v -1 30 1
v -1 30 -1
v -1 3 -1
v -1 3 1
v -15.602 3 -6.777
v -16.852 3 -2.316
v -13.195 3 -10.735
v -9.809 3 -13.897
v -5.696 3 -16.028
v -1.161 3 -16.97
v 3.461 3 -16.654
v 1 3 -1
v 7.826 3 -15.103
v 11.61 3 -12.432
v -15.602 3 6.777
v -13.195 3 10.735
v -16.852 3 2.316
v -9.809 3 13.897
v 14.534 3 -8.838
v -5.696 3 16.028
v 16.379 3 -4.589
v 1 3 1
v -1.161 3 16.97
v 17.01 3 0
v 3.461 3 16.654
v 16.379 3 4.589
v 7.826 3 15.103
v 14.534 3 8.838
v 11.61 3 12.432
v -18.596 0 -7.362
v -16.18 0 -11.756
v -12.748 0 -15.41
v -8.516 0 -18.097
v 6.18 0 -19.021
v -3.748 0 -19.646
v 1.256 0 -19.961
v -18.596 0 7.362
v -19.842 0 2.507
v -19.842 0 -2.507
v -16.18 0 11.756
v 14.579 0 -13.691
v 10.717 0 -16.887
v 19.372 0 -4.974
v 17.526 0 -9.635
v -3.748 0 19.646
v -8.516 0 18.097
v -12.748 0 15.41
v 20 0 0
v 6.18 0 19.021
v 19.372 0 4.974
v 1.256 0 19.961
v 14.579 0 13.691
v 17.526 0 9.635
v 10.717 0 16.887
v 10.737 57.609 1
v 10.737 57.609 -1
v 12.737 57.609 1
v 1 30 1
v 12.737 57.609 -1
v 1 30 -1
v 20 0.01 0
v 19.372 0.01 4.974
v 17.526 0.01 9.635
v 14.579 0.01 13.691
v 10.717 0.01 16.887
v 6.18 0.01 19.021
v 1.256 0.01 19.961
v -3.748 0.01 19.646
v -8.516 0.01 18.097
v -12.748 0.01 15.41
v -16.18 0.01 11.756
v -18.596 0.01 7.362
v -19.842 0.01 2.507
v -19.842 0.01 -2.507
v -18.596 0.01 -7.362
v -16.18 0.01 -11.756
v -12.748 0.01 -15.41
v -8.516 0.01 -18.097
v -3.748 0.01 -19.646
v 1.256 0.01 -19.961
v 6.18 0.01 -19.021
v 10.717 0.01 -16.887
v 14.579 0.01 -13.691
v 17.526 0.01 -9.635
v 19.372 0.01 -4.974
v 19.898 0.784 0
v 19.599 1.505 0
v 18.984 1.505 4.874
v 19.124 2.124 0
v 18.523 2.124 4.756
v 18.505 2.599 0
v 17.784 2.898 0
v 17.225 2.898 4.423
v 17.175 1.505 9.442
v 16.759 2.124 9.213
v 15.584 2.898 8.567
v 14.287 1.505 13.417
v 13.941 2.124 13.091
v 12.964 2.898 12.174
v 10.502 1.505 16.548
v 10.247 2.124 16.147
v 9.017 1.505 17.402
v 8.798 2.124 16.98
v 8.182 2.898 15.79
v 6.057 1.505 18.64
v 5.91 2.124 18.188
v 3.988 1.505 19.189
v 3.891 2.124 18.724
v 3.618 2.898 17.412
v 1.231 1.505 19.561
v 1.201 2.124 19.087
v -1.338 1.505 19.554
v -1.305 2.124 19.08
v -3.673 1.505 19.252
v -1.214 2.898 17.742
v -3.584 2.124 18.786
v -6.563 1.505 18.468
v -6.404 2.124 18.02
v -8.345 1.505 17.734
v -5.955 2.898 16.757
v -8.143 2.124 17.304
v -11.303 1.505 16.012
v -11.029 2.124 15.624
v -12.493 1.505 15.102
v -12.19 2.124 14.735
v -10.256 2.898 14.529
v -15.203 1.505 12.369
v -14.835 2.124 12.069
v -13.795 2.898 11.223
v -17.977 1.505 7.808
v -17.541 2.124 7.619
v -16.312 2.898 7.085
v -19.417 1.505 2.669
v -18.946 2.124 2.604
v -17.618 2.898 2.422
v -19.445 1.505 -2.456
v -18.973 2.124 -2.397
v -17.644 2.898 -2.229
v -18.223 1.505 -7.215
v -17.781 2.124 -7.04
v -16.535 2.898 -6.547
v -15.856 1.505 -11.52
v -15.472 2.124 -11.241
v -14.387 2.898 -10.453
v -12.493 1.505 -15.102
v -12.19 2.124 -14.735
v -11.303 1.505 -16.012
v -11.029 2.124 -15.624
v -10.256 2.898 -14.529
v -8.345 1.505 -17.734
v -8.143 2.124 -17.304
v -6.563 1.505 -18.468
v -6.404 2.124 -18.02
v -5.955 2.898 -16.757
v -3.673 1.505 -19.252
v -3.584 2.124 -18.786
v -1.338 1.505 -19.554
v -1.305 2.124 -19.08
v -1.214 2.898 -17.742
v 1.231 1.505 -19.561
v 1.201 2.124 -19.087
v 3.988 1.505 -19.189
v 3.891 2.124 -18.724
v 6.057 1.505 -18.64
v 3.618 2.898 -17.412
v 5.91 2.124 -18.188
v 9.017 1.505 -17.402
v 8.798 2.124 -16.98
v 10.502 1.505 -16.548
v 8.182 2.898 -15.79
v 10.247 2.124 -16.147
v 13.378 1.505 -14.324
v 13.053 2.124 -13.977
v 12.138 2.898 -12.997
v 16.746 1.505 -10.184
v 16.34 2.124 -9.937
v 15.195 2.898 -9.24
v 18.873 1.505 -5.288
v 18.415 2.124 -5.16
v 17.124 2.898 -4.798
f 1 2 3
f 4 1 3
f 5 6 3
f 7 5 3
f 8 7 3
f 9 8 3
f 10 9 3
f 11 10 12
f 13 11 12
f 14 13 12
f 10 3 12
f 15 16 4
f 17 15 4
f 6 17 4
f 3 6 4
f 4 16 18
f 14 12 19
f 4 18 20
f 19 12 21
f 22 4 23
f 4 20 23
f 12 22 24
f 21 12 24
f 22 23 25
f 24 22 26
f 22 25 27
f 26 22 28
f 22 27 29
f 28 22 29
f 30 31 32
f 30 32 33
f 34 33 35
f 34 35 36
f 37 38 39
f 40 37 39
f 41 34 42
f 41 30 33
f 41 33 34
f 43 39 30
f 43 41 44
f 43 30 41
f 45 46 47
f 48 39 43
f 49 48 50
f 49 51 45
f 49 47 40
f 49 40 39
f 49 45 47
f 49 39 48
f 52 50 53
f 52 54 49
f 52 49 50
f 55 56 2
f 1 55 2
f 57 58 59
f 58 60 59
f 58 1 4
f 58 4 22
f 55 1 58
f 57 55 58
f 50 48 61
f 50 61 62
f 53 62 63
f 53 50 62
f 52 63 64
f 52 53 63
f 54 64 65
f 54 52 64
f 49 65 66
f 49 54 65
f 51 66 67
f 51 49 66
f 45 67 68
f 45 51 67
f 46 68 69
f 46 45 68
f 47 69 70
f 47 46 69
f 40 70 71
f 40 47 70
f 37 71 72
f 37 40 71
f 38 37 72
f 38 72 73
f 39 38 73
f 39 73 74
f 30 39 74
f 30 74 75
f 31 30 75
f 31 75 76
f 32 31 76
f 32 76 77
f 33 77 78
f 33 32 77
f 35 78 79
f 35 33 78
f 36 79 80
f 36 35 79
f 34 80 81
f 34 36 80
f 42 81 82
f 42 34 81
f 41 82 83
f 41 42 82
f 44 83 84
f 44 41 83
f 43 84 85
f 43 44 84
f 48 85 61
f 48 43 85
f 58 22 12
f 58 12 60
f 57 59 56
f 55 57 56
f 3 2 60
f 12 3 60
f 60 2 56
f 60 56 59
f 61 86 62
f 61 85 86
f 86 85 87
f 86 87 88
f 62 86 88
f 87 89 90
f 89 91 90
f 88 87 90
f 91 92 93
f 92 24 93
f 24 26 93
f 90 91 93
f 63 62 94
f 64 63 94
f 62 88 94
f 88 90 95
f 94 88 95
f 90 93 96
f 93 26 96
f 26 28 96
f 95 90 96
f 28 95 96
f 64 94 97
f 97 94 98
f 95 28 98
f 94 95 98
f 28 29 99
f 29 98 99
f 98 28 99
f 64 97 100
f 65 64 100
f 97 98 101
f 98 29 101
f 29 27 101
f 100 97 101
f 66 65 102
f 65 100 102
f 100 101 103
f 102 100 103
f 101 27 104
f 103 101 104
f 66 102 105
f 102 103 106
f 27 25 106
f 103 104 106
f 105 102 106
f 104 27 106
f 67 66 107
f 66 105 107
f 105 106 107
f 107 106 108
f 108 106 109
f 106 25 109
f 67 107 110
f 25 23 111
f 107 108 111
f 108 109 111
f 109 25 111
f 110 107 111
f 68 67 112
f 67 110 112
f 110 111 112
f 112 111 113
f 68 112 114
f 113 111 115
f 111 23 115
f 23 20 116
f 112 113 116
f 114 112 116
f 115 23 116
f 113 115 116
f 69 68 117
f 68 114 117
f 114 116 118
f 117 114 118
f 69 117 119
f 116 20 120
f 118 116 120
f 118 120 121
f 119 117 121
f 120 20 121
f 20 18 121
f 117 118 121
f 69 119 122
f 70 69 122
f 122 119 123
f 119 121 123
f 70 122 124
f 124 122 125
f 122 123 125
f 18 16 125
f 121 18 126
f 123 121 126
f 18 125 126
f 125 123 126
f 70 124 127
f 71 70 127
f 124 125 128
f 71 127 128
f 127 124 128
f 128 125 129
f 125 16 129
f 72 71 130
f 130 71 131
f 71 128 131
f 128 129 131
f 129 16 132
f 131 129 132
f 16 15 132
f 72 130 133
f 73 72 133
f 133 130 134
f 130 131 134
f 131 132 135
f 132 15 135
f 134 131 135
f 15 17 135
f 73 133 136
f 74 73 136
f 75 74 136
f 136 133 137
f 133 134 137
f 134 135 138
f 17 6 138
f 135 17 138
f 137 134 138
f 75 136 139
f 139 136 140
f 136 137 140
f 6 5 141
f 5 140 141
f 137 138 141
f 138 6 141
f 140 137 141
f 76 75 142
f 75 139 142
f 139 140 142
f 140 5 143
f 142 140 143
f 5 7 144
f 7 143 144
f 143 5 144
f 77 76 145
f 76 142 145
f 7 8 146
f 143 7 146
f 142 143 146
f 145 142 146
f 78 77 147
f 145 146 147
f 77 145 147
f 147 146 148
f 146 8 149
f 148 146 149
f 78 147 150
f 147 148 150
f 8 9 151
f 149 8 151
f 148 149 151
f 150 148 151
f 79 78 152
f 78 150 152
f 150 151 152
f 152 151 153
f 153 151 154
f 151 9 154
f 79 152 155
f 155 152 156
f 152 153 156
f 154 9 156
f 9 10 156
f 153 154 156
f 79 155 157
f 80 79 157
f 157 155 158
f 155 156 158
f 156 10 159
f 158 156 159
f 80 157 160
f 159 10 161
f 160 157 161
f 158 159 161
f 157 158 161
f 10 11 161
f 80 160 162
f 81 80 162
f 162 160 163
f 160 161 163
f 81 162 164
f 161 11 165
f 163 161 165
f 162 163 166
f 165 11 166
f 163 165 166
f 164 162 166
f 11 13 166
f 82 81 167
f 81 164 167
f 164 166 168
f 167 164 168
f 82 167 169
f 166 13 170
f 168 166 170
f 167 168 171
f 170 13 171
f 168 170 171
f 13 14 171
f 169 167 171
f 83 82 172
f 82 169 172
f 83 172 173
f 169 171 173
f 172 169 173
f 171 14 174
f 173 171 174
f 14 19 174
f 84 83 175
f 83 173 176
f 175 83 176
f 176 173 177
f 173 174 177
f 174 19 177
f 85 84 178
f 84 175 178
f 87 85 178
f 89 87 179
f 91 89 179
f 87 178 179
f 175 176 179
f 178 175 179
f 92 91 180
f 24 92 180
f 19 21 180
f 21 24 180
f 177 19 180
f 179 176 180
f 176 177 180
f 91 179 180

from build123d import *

# Parameters (mm, degrees)
SKETCH_R          = 20
PAD_DEPTH         = 3
PAD001_DEPTH      = 1
PAD001_DEPTH_BACK = 1
FILLET_R          = 2.99


with BuildPart() as part:
    # Sketch → Pad (new body)
    with BuildSketch(Plane.XZ):
        Circle(SKETCH_R)
    extrude(amount=-PAD_DEPTH)

    # Sketch001 → Pad001 (join, two sides)
    with BuildSketch(Plane.XY) as pad001_sk:
        Polygon((-1, 0), (1, 0), (1, 30), (12.736545, 57.608939), (10.736545, 57.608939), (-1, 30), align=None)
    extrude(amount=PAD001_DEPTH)
    extrude(pad001_sk.sketch, amount=-PAD001_DEPTH_BACK)

    # Fillet
    fillet_edges = [part.edges().sort_by_distance(p)[0] for p in [
        (-20, 3, 0),
    ]]
    fillet(fillet_edges, radius=FILLET_R)


solid = part.part
